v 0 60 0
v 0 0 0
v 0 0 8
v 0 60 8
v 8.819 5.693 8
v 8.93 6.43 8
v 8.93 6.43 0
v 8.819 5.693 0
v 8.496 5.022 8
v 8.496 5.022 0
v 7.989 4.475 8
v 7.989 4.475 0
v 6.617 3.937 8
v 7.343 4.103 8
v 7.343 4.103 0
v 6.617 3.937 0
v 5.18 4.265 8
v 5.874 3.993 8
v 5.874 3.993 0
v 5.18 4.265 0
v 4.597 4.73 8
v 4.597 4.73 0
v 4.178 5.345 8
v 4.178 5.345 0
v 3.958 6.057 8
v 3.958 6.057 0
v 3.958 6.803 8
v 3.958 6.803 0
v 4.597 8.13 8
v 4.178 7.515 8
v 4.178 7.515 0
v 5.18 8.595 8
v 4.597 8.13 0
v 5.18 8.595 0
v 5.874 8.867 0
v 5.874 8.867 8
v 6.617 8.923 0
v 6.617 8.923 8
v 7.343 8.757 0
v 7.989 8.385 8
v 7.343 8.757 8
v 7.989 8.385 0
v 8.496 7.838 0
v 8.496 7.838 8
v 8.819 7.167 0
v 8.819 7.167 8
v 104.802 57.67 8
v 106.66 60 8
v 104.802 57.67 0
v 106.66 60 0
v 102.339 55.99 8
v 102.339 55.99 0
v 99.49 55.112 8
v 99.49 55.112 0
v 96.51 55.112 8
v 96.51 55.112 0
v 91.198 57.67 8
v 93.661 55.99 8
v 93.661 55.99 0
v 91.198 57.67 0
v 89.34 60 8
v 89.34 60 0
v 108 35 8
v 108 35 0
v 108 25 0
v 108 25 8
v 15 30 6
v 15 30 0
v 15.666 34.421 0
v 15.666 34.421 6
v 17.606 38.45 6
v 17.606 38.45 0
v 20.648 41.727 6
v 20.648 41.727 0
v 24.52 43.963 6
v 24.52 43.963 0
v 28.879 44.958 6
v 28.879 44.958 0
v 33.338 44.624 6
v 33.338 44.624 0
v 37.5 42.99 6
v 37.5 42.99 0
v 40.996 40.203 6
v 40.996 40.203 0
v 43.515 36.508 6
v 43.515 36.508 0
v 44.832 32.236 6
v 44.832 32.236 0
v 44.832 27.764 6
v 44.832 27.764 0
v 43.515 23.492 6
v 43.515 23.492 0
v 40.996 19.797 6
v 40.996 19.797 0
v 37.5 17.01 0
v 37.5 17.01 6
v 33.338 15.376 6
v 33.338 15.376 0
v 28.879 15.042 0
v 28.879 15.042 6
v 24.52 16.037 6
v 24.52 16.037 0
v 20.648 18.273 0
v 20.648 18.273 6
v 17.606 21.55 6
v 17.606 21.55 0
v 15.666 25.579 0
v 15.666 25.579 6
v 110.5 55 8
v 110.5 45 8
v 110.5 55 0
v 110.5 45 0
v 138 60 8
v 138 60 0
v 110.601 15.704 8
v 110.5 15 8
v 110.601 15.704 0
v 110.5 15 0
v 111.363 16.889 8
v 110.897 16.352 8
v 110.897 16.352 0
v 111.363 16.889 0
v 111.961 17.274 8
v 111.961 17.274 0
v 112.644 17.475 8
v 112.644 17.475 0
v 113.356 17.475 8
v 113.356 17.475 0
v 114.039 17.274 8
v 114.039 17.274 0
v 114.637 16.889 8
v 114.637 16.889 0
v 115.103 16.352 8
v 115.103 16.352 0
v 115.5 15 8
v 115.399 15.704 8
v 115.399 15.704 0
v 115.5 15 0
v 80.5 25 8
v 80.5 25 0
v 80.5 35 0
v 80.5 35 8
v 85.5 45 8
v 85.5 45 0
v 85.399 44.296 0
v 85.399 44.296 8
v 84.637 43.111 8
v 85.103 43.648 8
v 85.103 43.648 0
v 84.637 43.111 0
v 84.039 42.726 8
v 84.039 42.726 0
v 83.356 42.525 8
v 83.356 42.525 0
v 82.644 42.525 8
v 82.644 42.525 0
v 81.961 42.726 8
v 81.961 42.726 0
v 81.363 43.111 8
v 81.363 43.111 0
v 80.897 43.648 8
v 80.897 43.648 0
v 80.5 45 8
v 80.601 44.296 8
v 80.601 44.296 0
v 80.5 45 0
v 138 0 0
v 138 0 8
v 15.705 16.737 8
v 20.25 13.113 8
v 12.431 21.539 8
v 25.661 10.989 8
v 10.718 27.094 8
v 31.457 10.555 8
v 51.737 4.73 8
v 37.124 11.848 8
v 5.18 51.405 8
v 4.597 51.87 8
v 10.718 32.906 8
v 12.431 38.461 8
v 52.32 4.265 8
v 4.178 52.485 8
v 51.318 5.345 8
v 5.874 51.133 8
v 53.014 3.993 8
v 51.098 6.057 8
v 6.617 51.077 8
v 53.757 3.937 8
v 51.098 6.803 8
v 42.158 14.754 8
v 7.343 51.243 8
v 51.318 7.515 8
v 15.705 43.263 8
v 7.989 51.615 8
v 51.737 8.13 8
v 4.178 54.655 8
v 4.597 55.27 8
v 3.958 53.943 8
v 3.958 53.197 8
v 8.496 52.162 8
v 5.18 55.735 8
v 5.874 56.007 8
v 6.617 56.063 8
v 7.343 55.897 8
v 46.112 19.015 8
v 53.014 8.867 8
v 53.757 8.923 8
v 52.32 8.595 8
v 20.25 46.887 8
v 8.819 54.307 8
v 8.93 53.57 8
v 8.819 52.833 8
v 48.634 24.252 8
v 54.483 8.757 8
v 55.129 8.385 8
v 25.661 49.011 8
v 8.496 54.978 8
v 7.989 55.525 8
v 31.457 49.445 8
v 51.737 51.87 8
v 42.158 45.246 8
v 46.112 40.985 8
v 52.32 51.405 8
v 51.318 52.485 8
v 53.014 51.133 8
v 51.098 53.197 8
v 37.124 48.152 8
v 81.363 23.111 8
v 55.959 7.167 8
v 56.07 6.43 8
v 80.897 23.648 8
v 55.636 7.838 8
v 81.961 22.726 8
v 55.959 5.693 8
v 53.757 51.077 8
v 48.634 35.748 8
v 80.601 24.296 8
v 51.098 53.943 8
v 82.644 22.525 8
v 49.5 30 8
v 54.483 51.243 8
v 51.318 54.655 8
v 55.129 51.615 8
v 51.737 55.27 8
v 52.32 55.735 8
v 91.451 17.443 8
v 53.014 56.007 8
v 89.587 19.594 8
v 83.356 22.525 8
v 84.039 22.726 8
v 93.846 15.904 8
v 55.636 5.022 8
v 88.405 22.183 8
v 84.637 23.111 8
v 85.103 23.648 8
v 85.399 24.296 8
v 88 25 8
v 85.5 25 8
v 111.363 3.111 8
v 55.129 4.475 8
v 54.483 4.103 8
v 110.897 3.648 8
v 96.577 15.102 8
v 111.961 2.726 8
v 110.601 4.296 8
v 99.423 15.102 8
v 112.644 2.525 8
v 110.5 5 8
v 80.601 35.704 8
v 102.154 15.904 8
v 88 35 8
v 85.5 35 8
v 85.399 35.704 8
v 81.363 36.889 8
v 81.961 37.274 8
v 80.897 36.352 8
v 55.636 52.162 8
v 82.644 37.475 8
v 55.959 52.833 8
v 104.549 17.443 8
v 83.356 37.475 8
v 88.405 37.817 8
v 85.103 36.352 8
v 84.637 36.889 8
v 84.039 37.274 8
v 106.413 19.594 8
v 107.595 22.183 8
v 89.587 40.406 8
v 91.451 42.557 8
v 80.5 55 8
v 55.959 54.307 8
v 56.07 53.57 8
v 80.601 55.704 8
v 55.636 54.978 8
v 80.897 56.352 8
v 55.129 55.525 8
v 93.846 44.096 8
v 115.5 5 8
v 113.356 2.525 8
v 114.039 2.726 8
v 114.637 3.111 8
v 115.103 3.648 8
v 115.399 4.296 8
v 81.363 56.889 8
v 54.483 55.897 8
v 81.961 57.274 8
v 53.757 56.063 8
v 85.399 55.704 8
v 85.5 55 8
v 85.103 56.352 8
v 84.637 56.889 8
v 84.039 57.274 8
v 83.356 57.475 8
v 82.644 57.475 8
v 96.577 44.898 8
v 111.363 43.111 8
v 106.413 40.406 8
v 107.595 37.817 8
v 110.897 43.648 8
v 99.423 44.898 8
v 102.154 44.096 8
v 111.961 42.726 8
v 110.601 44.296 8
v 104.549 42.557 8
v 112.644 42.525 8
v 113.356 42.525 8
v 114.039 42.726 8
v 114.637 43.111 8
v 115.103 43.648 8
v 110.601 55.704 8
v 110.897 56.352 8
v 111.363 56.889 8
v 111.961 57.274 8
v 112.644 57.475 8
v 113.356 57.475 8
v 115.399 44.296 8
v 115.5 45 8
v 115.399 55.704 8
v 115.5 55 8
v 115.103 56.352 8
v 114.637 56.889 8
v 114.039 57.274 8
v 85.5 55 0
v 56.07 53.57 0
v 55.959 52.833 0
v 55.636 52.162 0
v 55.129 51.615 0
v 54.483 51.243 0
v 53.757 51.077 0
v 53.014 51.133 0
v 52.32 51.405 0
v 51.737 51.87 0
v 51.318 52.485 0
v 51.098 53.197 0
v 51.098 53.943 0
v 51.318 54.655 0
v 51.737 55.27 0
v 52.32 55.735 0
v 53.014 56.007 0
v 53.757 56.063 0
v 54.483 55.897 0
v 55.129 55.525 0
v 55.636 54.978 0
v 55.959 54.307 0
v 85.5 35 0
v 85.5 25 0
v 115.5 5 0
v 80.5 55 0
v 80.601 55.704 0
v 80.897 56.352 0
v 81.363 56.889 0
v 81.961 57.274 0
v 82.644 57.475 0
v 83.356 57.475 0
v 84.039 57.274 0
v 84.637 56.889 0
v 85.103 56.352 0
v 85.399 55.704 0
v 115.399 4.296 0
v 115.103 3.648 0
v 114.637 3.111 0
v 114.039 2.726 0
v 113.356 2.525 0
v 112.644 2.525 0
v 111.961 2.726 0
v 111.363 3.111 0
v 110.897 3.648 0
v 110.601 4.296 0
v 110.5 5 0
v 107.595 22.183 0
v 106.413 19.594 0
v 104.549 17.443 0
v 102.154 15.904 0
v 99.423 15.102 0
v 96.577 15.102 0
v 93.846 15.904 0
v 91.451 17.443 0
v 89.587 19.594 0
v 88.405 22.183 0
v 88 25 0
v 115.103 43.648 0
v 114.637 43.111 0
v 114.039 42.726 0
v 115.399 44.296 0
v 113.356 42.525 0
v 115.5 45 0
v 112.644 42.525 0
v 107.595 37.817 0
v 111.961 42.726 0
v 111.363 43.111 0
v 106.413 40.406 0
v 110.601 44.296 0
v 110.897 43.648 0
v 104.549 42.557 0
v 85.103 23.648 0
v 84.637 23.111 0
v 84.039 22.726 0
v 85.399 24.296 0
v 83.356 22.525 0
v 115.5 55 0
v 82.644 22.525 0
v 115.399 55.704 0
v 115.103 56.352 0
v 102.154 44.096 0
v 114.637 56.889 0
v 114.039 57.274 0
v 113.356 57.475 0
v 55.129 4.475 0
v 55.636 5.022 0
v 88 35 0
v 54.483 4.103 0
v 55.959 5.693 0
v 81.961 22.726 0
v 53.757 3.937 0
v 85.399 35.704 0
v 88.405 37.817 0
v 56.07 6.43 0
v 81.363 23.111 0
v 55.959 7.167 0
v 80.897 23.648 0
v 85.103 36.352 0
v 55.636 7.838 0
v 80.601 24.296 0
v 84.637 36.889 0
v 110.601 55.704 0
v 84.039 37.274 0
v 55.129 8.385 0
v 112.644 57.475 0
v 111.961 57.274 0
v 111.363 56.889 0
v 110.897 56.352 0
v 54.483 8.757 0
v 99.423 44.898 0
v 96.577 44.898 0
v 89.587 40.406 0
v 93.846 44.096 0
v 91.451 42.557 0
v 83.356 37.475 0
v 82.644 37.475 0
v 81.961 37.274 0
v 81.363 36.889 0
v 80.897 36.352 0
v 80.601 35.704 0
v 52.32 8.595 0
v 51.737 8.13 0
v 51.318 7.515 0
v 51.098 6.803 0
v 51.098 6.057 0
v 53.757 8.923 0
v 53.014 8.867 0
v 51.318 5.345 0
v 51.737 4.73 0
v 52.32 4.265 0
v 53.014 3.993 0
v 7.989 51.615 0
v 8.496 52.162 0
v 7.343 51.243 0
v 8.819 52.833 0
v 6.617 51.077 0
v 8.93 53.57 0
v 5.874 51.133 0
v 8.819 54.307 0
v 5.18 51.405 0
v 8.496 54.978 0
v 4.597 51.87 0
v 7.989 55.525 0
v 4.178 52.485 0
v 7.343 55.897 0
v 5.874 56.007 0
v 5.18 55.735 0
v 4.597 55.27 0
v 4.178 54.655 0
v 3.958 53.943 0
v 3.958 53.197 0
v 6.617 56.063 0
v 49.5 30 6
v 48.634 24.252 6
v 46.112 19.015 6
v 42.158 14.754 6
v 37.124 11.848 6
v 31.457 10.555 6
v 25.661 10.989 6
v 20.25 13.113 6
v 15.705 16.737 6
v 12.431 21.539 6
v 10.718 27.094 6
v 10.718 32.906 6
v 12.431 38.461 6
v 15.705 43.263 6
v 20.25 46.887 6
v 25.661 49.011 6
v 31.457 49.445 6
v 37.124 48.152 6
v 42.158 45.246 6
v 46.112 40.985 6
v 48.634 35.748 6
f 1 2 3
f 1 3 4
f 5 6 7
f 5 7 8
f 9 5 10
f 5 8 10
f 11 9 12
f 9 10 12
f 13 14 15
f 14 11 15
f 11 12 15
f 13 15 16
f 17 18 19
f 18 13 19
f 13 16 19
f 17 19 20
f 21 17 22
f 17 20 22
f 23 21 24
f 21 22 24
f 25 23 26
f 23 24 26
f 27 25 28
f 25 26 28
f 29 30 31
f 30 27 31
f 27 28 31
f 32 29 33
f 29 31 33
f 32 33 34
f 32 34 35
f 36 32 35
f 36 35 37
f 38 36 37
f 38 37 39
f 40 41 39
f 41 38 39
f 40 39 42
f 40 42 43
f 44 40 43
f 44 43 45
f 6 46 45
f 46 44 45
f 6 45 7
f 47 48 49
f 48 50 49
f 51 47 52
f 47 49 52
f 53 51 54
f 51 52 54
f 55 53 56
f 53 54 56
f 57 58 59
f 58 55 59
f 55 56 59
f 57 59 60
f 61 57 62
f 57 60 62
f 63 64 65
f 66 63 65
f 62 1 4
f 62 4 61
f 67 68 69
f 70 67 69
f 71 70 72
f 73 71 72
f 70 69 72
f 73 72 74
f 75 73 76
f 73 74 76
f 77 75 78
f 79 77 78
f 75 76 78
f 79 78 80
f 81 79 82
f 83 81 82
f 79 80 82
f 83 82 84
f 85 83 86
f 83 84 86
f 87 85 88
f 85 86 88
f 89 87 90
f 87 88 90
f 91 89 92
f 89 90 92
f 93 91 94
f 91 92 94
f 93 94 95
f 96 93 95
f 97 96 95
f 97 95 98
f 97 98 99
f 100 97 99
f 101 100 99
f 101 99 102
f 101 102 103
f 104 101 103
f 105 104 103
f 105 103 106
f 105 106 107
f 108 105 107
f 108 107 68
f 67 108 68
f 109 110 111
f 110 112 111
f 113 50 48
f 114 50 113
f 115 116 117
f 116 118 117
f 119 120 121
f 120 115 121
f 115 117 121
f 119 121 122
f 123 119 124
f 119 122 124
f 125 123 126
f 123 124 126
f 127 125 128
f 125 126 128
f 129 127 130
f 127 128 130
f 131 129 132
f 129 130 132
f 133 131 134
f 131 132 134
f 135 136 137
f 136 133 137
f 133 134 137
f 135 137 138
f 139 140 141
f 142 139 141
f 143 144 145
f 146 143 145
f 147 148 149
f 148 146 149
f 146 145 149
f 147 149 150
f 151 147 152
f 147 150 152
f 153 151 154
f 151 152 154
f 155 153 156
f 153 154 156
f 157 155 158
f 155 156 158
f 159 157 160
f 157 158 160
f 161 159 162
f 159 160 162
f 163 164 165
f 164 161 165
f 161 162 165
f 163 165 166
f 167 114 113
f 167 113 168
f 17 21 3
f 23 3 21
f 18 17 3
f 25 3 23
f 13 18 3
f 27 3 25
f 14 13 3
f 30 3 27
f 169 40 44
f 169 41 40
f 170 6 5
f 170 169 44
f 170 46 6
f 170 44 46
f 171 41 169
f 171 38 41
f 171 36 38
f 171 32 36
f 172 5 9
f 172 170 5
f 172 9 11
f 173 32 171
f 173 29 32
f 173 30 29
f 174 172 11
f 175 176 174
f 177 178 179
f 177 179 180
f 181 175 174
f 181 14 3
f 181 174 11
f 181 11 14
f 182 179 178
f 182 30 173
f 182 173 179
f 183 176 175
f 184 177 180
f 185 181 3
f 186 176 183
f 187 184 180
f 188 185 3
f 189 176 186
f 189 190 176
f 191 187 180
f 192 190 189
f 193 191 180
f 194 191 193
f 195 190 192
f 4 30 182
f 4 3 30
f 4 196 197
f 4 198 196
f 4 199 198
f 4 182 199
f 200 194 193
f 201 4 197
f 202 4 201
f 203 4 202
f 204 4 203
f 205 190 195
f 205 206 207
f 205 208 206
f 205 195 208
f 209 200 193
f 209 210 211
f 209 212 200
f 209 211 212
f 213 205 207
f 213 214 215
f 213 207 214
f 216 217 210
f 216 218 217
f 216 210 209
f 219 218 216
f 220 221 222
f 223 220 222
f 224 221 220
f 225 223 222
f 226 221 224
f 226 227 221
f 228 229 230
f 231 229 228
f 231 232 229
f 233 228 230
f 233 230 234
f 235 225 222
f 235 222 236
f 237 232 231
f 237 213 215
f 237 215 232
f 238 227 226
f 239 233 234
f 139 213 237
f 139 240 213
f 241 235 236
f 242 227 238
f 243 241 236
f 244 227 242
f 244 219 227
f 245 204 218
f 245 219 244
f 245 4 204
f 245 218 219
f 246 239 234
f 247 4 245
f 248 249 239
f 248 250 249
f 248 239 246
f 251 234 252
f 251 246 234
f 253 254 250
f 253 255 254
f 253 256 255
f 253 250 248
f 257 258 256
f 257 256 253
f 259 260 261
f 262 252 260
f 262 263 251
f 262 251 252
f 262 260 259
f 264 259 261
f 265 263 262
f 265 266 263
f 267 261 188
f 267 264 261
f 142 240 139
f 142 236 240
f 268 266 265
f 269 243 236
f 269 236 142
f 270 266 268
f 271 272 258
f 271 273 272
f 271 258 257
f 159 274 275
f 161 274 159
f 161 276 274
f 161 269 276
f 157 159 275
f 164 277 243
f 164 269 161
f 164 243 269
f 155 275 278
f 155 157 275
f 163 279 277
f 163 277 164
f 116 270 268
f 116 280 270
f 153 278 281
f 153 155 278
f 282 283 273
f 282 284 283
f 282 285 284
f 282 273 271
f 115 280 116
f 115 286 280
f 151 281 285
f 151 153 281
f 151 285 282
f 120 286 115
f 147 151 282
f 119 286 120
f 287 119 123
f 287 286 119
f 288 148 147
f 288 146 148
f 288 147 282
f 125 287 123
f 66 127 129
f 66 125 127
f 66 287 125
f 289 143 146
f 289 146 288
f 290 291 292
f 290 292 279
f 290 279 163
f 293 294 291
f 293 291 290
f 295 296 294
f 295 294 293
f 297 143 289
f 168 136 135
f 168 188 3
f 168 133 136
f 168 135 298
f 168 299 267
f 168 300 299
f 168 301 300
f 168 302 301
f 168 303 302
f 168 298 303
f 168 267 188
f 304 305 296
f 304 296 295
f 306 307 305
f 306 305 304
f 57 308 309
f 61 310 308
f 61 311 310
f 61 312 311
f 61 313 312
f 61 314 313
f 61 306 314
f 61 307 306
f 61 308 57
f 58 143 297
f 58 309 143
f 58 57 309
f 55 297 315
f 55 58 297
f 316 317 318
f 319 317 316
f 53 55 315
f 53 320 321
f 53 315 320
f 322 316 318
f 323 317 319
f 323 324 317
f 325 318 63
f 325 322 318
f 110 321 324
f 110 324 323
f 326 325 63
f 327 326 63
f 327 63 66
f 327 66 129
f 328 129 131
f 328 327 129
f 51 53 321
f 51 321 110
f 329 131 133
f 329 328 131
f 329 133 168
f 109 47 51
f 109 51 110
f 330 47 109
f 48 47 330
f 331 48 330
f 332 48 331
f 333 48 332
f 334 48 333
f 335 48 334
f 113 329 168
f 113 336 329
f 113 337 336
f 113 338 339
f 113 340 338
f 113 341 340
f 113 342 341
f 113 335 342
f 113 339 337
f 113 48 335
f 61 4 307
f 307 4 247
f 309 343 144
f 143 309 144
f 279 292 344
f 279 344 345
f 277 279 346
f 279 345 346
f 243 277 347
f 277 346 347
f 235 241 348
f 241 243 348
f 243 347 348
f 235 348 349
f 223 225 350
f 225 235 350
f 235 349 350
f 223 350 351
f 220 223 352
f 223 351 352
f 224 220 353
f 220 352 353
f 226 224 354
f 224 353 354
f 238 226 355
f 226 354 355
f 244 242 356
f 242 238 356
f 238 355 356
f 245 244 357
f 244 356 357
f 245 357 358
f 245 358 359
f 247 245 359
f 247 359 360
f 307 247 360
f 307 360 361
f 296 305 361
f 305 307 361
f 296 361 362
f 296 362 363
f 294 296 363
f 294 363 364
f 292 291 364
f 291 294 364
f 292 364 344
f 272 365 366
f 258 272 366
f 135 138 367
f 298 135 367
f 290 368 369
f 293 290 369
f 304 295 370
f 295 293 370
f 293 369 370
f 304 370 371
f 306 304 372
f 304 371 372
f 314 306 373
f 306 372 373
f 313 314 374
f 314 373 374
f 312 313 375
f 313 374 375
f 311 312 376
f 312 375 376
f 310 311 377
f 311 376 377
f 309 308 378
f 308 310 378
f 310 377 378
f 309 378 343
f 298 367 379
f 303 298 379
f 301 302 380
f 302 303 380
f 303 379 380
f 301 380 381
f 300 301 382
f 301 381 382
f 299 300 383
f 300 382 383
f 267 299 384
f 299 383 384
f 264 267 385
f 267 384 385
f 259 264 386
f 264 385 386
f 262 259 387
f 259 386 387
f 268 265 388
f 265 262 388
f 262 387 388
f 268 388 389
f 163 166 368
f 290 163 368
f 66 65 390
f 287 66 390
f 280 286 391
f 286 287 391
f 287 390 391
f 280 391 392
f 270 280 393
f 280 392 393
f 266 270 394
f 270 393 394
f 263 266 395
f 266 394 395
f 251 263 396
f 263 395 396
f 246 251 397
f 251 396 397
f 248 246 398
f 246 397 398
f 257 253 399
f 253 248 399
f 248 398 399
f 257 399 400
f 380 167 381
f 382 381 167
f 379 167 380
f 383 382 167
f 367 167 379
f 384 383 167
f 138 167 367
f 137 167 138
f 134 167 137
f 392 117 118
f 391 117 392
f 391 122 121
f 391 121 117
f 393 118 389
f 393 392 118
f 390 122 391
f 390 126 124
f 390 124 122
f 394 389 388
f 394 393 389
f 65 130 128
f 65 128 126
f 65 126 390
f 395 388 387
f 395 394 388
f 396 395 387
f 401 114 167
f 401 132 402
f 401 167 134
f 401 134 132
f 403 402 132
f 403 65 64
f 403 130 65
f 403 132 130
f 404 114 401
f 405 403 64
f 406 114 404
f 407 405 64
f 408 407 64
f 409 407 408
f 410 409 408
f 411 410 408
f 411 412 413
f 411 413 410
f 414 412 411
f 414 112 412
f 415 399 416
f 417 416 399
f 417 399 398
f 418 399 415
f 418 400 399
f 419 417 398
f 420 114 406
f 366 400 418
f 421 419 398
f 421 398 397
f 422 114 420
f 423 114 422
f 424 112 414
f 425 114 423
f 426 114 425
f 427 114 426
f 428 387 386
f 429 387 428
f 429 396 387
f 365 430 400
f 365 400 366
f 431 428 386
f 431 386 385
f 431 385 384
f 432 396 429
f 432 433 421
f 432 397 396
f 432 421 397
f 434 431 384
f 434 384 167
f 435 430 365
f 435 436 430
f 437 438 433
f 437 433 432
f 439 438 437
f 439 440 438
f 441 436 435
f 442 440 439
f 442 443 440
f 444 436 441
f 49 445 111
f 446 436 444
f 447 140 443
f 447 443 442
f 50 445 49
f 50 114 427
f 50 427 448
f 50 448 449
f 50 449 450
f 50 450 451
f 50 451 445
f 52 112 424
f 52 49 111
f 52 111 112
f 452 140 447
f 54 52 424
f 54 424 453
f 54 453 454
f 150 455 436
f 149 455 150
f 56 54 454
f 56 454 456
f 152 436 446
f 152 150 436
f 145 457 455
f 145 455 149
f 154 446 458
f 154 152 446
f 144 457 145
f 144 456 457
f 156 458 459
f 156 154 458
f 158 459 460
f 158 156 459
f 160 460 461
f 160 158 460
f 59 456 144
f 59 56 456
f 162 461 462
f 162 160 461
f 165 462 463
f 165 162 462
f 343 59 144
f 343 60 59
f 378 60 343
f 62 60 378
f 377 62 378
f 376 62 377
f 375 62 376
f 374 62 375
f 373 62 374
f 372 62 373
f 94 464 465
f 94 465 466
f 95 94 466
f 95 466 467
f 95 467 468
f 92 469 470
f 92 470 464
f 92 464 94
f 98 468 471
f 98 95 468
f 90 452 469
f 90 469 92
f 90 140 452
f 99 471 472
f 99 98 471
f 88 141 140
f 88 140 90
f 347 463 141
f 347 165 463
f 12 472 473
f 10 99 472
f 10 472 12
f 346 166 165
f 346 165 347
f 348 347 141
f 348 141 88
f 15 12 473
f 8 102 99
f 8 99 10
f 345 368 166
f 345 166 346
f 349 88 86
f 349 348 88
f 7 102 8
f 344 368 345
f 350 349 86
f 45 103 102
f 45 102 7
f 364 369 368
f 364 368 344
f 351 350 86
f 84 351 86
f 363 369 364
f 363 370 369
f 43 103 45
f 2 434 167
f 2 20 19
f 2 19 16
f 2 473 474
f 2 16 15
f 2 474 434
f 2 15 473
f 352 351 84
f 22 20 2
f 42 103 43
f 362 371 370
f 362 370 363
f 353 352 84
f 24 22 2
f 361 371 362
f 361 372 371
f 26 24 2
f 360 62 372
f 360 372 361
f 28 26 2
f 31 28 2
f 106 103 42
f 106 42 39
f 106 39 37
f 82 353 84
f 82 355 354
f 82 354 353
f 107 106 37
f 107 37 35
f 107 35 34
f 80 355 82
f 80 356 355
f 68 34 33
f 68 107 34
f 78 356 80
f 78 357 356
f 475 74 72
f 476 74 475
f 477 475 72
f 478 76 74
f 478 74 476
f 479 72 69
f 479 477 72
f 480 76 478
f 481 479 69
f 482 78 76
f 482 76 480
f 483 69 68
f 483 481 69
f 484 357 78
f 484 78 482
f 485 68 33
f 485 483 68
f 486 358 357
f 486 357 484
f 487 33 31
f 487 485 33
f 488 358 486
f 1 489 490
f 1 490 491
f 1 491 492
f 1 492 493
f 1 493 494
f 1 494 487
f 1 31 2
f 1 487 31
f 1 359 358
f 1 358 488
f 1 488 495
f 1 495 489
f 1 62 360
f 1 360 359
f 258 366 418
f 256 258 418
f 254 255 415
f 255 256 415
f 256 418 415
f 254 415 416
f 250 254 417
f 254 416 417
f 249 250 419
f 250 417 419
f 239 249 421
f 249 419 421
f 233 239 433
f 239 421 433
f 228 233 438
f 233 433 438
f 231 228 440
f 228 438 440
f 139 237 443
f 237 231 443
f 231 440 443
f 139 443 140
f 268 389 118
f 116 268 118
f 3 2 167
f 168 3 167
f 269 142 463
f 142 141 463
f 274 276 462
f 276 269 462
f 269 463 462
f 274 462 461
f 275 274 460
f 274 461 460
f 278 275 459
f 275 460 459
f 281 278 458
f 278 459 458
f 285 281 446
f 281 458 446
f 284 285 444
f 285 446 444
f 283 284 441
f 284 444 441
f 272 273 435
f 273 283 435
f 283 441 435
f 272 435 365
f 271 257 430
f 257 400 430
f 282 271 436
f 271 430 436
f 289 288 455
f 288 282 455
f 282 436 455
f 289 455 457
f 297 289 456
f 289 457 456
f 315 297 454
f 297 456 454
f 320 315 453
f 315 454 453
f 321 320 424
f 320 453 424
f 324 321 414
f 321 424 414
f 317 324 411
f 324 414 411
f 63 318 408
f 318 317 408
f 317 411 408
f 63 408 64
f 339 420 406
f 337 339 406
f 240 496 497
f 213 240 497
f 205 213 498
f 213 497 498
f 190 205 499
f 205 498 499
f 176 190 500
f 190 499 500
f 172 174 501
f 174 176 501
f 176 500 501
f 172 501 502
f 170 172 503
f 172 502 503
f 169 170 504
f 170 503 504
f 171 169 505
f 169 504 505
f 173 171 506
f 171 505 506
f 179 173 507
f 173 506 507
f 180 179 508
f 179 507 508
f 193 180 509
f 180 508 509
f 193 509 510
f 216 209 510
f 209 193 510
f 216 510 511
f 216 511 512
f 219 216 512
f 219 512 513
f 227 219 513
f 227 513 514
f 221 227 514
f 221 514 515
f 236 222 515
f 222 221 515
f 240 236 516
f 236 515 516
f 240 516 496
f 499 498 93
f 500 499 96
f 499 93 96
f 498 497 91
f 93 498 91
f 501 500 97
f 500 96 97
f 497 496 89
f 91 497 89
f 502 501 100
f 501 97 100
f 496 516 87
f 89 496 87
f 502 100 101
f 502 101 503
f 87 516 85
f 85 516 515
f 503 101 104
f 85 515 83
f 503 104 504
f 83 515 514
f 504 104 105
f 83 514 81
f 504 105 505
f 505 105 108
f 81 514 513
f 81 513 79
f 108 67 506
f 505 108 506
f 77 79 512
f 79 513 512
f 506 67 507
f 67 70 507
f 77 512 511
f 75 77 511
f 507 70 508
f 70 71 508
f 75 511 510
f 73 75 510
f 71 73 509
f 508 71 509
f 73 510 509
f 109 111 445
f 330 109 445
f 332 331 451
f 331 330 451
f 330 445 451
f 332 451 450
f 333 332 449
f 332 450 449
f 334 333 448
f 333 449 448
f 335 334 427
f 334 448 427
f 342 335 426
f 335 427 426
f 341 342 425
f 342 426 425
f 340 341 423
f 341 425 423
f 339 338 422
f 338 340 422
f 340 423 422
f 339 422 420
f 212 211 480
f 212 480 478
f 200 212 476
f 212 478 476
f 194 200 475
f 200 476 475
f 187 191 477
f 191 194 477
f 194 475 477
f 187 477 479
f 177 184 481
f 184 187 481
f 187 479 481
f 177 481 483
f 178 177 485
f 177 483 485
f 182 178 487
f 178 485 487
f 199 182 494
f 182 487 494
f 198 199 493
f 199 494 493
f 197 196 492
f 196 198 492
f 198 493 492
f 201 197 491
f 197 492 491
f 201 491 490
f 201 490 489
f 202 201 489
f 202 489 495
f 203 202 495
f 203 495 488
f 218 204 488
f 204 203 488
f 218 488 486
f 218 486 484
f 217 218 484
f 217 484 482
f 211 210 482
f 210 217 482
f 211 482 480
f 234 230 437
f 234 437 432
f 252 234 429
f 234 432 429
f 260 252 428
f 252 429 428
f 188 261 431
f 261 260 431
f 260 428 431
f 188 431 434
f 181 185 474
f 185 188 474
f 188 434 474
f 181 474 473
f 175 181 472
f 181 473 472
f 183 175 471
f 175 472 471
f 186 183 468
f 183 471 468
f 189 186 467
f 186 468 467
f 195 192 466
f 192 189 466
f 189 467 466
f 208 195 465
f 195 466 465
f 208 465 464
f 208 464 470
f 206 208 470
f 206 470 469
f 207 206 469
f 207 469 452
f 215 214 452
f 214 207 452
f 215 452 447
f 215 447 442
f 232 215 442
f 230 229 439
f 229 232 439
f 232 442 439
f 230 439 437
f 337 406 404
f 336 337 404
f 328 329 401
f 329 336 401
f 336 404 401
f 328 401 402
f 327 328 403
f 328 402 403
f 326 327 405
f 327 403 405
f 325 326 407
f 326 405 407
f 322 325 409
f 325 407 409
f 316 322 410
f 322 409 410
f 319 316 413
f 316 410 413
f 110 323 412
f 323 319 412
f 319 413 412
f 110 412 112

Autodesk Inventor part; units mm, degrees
ref_plane "YZ Plane" through (0, 0, 0) normal (1, 0, 0) x (0, 1, 0)
ref_plane "XZ Plane" through (0, 0, 0) normal (0, 1, 0) x (-1, 0, 0)
ref_plane "XY Plane" through (0, 0, 0) normal (0, 0, 1) x (1, 0, 0)
sketch "Szkic1" plane through (0, 0, 0) normal (0, 0, 1) x (1, 0, 0)
  arc A0 (89.3398, 60) -> (106.6602, 60) centre (98, 65.0001) ccw
  line L0 (70, 60) -> (89.3398, 60)
  line L1 (70, 0) -> (70, 60)
  line L2 (70, 0) -> (138, 0)
  line L3 (138, 60) -> (138, 0)
  line L4 (106.6602, 60) -> (138, 60)
  line L5 (80.5, 25) -> (80.5, 35)
  arc A1 (85.5, 35) -> (80.5, 35) centre (83, 35) ccw
  line L6 (85.5, 35) -> (85.5, 25)
  arc A2 (80.5, 25) -> (85.5, 25) centre (83, 25) ccw
  line L7 (115.5, 55) -> (115.5, 45)
  arc A3 (110.5, 45) -> (115.5, 45) centre (113, 45) ccw
  line L8 (110.5, 45) -> (110.5, 55)
  arc A4 (115.5, 55) -> (110.5, 55) centre (113, 55) ccw
  line L9 (80.5, 45) -> (80.5, 55)
  arc A5 (85.5, 55) -> (80.5, 55) centre (83, 55) ccw
  line L10 (85.5, 55) -> (85.5, 45)
  arc A6 (80.5, 45) -> (85.5, 45) centre (83, 45) ccw
  line L11 (115.5, 15) -> (115.5, 5)
  arc A7 (110.5, 5) -> (115.5, 5) centre (113, 5) ccw
  line L12 (110.5, 5) -> (110.5, 15)
  arc A8 (115.5, 15) -> (110.5, 15) centre (113, 15) ccw
  line L13 (88, 25) -> (88, 35)
  arc A9 (108, 35) -> (88, 35) centre (98, 35) ccw
  line L14 (108, 35) -> (108, 25)
  arc A10 (88, 25) -> (108, 25) centre (98, 25) ccw
  circle A11 centre (30, 30) radius 19.5
  circle A12 centre (53.57, 53.57) radius 2.5
  circle A13 centre (6.43, 6.43) radius 2.5
  circle A14 centre (6.43, 53.57) radius 2.5
  circle A15 centre (53.57, 6.43) radius 2.5
  line L15 (70, 60) -> (70, 0)
  line L16 (0, 60) -> (70, 60)
  line L17 (0, 0) -> (0, 60)
  line L18 (70, 0) -> (0, 0)
  circle A16 centre (30, 30) radius 15
  point P0 (35, 30)
extrude "Wyciągnięcie proste1" add sketch "Szkic1" along normal blind 8 contours A0 L4 L3 L2 L1 L0 | L1 L18 L17 L16
sketch "Szkic2" plane through (0, 0, 0) normal (0, 0, -1) x (-1, 0, 0)
  circle A0 centre (-30, 30) radius 15 projected
  circle A1 centre (-30, 30) radius 19.5 projected
  point P0 (0, 0)
extrude "Wyciągnięcie proste2" add sketch "Szkic2" against normal blind 6
thread "Gwint1" size "M5x0.8" class "6H" standard "ANSI Metric M Profile" full length
thread "Gwint2" size "M5x0.8" class "6H" standard "ANSI Metric M Profile" full length
thread "Gwint3" size "M5x0.8" class "6H" standard "ANSI Metric M Profile" full length
thread "Gwint4" size "M5x0.8" class "6H" standard "ANSI Metric M Profile" full length
properties part number "Uchwyt silnika krokowego osi X - płaski"
